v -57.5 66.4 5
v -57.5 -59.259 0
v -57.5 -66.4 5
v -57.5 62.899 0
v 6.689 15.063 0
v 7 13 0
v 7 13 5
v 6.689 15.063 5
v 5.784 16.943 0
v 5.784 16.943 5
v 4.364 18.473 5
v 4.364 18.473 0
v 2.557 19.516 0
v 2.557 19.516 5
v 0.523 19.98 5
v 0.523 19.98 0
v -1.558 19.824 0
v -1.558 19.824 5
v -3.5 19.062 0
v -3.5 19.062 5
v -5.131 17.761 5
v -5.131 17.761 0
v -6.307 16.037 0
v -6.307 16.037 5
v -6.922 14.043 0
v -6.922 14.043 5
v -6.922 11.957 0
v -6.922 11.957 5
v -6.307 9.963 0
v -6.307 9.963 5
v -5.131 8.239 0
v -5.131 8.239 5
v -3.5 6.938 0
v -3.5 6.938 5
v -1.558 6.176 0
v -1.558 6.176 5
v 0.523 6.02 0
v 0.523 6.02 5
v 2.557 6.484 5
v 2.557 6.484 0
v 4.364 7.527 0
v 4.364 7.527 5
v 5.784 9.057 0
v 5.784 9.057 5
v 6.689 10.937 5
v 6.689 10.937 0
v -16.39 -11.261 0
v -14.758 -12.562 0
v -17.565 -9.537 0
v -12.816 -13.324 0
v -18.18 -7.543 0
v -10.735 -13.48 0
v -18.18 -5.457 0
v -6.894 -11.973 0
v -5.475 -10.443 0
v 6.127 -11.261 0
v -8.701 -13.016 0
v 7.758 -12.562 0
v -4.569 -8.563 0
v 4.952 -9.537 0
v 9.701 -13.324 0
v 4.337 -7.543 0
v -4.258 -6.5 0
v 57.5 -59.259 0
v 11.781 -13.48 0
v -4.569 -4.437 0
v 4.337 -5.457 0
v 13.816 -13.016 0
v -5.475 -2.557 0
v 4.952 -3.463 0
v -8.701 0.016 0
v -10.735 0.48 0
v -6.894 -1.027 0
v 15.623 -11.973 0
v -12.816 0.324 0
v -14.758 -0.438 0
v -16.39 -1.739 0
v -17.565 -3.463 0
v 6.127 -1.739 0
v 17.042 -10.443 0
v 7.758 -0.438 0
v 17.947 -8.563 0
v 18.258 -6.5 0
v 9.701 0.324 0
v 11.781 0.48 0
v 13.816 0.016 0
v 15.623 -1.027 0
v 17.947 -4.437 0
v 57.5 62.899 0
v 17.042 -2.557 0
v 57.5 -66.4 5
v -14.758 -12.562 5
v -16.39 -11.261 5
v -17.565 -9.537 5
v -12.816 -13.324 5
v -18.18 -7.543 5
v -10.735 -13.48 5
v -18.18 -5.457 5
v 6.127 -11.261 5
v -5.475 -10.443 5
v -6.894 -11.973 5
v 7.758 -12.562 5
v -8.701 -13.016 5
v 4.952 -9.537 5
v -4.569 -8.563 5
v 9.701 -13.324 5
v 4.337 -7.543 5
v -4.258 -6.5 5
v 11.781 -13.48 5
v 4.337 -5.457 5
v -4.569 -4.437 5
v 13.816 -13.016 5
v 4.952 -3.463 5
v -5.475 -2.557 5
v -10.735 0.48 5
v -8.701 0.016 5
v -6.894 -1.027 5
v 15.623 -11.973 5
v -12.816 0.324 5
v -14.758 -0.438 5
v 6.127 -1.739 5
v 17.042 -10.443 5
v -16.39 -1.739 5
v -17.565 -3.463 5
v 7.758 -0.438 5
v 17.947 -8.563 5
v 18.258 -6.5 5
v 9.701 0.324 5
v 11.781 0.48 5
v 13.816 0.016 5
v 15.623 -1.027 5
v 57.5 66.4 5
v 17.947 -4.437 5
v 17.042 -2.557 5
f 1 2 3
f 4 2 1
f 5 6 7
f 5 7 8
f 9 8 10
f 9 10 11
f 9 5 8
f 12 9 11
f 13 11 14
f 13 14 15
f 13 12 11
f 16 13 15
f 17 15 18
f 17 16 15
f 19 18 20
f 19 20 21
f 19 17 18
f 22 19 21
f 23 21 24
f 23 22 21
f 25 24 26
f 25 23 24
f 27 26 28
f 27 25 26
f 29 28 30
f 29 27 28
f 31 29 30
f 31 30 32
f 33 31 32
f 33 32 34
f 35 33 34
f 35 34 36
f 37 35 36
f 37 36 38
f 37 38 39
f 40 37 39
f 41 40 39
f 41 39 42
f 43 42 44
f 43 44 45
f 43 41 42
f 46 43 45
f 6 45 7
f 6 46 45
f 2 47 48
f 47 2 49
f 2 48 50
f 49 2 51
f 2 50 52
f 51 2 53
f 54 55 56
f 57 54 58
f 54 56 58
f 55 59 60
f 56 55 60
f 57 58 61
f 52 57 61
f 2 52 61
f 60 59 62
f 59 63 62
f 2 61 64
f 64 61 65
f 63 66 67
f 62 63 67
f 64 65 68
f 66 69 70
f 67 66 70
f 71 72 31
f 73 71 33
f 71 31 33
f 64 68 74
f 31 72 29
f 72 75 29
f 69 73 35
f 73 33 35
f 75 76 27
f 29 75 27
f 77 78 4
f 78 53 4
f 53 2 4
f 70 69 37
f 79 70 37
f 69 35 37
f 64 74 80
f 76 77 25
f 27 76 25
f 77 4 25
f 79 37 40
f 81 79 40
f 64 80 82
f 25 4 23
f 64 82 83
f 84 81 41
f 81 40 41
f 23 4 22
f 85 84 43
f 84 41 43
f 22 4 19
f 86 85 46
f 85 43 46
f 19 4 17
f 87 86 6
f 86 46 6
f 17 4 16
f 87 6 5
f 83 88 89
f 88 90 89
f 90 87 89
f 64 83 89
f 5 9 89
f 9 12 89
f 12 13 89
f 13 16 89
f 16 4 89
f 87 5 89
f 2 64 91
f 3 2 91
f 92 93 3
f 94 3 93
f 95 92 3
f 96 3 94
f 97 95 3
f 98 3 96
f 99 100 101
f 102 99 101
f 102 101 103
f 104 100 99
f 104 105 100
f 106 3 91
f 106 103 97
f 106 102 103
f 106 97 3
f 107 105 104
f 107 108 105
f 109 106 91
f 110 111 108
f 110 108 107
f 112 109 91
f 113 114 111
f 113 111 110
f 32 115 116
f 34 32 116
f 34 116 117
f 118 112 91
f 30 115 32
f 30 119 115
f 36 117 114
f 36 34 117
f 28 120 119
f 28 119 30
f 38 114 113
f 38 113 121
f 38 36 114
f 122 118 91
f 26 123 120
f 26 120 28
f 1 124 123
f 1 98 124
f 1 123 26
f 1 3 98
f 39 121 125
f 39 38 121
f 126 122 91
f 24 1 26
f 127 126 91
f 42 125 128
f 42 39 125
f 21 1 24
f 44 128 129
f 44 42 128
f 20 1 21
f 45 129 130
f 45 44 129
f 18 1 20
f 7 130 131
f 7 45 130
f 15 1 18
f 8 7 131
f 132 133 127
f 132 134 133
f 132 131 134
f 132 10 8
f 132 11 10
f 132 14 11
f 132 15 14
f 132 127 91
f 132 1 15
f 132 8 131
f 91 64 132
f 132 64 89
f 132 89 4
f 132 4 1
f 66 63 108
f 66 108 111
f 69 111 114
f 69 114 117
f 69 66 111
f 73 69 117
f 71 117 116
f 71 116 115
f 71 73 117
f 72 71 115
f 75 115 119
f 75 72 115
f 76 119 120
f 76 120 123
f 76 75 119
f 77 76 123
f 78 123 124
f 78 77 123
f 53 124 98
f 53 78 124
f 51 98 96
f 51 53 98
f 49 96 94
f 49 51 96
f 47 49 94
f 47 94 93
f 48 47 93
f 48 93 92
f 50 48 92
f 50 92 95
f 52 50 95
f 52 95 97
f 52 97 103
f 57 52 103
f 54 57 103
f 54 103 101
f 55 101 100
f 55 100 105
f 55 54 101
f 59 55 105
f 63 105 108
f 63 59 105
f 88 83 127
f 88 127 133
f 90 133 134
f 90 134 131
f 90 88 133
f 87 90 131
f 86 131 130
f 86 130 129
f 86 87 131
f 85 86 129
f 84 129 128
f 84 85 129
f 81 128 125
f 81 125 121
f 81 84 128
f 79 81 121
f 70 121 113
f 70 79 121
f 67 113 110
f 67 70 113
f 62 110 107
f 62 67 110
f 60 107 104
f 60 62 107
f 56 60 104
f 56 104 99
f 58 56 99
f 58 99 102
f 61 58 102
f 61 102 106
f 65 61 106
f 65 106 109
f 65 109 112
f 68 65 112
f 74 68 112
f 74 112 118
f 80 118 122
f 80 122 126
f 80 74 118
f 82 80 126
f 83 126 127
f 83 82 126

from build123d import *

# Parameters (mm, degrees)
SKETCH1_W           = 115
SKETCH1_H           = 132.8
SKETCH1_R           = 7
BOSS_EXTRUDE1_DEPTH = 5
CUT_EXTRUDE1_REACH  = 117
CUT_EXTRUDE2_REACH  = 117


with BuildPart() as part:
    # Sketch1 → Boss-Extrude1 (new body)
    with BuildSketch(Plane.XY):
        Rectangle(SKETCH1_W, SKETCH1_H)
        with Locations((0, 13)):
            Circle(SKETCH1_R, mode=Mode.SUBTRACT)
        with Locations((-11.258330249, -6.5)):
            Circle(SKETCH1_R, mode=Mode.SUBTRACT)
        with Locations((11.258330249, -6.5)):
            Circle(SKETCH1_R, mode=Mode.SUBTRACT)
    extrude(amount=BOSS_EXTRUDE1_DEPTH)

    # Sketch2 → Cut-Extrude1 (cut, up to next)
    with BuildSketch(Plane(origin=(57.5, 0, 0), x_dir=(0, 0, -1), z_dir=(1, 0, 0)), mode=Mode.PRIVATE) as cut_extrude1_sk1:
        Polygon((-5, -66.4), (0, -66.4), (0, -59.259259966), align=None)
    cut_extrude1_tool1 = extrude(cut_extrude1_sk1.sketch, amount=-CUT_EXTRUDE1_REACH, mode=Mode.PRIVATE) & part.part
    add(cut_extrude1_tool1.solids().sort_by_distance((57.5, -64.019753, 1.666667))[0], mode=Mode.SUBTRACT)

    # Sketch3 → Cut-Extrude2 (cut, up to next)
    with BuildSketch(Plane(origin=(57.5, 0, 0), x_dir=(0, 0, -1), z_dir=(1, 0, 0)), mode=Mode.PRIVATE) as cut_extrude2_sk1:
        Polygon((-5, 66.4), (0, 66.4), (0, 62.898962309), align=None)
    cut_extrude2_tool1 = extrude(cut_extrude2_sk1.sketch, amount=-CUT_EXTRUDE2_REACH, mode=Mode.PRIVATE) & part.part
    add(cut_extrude2_tool1.solids().sort_by_distance((57.5, 65.232987, 1.666667))[0], mode=Mode.SUBTRACT)


solid = part.part
